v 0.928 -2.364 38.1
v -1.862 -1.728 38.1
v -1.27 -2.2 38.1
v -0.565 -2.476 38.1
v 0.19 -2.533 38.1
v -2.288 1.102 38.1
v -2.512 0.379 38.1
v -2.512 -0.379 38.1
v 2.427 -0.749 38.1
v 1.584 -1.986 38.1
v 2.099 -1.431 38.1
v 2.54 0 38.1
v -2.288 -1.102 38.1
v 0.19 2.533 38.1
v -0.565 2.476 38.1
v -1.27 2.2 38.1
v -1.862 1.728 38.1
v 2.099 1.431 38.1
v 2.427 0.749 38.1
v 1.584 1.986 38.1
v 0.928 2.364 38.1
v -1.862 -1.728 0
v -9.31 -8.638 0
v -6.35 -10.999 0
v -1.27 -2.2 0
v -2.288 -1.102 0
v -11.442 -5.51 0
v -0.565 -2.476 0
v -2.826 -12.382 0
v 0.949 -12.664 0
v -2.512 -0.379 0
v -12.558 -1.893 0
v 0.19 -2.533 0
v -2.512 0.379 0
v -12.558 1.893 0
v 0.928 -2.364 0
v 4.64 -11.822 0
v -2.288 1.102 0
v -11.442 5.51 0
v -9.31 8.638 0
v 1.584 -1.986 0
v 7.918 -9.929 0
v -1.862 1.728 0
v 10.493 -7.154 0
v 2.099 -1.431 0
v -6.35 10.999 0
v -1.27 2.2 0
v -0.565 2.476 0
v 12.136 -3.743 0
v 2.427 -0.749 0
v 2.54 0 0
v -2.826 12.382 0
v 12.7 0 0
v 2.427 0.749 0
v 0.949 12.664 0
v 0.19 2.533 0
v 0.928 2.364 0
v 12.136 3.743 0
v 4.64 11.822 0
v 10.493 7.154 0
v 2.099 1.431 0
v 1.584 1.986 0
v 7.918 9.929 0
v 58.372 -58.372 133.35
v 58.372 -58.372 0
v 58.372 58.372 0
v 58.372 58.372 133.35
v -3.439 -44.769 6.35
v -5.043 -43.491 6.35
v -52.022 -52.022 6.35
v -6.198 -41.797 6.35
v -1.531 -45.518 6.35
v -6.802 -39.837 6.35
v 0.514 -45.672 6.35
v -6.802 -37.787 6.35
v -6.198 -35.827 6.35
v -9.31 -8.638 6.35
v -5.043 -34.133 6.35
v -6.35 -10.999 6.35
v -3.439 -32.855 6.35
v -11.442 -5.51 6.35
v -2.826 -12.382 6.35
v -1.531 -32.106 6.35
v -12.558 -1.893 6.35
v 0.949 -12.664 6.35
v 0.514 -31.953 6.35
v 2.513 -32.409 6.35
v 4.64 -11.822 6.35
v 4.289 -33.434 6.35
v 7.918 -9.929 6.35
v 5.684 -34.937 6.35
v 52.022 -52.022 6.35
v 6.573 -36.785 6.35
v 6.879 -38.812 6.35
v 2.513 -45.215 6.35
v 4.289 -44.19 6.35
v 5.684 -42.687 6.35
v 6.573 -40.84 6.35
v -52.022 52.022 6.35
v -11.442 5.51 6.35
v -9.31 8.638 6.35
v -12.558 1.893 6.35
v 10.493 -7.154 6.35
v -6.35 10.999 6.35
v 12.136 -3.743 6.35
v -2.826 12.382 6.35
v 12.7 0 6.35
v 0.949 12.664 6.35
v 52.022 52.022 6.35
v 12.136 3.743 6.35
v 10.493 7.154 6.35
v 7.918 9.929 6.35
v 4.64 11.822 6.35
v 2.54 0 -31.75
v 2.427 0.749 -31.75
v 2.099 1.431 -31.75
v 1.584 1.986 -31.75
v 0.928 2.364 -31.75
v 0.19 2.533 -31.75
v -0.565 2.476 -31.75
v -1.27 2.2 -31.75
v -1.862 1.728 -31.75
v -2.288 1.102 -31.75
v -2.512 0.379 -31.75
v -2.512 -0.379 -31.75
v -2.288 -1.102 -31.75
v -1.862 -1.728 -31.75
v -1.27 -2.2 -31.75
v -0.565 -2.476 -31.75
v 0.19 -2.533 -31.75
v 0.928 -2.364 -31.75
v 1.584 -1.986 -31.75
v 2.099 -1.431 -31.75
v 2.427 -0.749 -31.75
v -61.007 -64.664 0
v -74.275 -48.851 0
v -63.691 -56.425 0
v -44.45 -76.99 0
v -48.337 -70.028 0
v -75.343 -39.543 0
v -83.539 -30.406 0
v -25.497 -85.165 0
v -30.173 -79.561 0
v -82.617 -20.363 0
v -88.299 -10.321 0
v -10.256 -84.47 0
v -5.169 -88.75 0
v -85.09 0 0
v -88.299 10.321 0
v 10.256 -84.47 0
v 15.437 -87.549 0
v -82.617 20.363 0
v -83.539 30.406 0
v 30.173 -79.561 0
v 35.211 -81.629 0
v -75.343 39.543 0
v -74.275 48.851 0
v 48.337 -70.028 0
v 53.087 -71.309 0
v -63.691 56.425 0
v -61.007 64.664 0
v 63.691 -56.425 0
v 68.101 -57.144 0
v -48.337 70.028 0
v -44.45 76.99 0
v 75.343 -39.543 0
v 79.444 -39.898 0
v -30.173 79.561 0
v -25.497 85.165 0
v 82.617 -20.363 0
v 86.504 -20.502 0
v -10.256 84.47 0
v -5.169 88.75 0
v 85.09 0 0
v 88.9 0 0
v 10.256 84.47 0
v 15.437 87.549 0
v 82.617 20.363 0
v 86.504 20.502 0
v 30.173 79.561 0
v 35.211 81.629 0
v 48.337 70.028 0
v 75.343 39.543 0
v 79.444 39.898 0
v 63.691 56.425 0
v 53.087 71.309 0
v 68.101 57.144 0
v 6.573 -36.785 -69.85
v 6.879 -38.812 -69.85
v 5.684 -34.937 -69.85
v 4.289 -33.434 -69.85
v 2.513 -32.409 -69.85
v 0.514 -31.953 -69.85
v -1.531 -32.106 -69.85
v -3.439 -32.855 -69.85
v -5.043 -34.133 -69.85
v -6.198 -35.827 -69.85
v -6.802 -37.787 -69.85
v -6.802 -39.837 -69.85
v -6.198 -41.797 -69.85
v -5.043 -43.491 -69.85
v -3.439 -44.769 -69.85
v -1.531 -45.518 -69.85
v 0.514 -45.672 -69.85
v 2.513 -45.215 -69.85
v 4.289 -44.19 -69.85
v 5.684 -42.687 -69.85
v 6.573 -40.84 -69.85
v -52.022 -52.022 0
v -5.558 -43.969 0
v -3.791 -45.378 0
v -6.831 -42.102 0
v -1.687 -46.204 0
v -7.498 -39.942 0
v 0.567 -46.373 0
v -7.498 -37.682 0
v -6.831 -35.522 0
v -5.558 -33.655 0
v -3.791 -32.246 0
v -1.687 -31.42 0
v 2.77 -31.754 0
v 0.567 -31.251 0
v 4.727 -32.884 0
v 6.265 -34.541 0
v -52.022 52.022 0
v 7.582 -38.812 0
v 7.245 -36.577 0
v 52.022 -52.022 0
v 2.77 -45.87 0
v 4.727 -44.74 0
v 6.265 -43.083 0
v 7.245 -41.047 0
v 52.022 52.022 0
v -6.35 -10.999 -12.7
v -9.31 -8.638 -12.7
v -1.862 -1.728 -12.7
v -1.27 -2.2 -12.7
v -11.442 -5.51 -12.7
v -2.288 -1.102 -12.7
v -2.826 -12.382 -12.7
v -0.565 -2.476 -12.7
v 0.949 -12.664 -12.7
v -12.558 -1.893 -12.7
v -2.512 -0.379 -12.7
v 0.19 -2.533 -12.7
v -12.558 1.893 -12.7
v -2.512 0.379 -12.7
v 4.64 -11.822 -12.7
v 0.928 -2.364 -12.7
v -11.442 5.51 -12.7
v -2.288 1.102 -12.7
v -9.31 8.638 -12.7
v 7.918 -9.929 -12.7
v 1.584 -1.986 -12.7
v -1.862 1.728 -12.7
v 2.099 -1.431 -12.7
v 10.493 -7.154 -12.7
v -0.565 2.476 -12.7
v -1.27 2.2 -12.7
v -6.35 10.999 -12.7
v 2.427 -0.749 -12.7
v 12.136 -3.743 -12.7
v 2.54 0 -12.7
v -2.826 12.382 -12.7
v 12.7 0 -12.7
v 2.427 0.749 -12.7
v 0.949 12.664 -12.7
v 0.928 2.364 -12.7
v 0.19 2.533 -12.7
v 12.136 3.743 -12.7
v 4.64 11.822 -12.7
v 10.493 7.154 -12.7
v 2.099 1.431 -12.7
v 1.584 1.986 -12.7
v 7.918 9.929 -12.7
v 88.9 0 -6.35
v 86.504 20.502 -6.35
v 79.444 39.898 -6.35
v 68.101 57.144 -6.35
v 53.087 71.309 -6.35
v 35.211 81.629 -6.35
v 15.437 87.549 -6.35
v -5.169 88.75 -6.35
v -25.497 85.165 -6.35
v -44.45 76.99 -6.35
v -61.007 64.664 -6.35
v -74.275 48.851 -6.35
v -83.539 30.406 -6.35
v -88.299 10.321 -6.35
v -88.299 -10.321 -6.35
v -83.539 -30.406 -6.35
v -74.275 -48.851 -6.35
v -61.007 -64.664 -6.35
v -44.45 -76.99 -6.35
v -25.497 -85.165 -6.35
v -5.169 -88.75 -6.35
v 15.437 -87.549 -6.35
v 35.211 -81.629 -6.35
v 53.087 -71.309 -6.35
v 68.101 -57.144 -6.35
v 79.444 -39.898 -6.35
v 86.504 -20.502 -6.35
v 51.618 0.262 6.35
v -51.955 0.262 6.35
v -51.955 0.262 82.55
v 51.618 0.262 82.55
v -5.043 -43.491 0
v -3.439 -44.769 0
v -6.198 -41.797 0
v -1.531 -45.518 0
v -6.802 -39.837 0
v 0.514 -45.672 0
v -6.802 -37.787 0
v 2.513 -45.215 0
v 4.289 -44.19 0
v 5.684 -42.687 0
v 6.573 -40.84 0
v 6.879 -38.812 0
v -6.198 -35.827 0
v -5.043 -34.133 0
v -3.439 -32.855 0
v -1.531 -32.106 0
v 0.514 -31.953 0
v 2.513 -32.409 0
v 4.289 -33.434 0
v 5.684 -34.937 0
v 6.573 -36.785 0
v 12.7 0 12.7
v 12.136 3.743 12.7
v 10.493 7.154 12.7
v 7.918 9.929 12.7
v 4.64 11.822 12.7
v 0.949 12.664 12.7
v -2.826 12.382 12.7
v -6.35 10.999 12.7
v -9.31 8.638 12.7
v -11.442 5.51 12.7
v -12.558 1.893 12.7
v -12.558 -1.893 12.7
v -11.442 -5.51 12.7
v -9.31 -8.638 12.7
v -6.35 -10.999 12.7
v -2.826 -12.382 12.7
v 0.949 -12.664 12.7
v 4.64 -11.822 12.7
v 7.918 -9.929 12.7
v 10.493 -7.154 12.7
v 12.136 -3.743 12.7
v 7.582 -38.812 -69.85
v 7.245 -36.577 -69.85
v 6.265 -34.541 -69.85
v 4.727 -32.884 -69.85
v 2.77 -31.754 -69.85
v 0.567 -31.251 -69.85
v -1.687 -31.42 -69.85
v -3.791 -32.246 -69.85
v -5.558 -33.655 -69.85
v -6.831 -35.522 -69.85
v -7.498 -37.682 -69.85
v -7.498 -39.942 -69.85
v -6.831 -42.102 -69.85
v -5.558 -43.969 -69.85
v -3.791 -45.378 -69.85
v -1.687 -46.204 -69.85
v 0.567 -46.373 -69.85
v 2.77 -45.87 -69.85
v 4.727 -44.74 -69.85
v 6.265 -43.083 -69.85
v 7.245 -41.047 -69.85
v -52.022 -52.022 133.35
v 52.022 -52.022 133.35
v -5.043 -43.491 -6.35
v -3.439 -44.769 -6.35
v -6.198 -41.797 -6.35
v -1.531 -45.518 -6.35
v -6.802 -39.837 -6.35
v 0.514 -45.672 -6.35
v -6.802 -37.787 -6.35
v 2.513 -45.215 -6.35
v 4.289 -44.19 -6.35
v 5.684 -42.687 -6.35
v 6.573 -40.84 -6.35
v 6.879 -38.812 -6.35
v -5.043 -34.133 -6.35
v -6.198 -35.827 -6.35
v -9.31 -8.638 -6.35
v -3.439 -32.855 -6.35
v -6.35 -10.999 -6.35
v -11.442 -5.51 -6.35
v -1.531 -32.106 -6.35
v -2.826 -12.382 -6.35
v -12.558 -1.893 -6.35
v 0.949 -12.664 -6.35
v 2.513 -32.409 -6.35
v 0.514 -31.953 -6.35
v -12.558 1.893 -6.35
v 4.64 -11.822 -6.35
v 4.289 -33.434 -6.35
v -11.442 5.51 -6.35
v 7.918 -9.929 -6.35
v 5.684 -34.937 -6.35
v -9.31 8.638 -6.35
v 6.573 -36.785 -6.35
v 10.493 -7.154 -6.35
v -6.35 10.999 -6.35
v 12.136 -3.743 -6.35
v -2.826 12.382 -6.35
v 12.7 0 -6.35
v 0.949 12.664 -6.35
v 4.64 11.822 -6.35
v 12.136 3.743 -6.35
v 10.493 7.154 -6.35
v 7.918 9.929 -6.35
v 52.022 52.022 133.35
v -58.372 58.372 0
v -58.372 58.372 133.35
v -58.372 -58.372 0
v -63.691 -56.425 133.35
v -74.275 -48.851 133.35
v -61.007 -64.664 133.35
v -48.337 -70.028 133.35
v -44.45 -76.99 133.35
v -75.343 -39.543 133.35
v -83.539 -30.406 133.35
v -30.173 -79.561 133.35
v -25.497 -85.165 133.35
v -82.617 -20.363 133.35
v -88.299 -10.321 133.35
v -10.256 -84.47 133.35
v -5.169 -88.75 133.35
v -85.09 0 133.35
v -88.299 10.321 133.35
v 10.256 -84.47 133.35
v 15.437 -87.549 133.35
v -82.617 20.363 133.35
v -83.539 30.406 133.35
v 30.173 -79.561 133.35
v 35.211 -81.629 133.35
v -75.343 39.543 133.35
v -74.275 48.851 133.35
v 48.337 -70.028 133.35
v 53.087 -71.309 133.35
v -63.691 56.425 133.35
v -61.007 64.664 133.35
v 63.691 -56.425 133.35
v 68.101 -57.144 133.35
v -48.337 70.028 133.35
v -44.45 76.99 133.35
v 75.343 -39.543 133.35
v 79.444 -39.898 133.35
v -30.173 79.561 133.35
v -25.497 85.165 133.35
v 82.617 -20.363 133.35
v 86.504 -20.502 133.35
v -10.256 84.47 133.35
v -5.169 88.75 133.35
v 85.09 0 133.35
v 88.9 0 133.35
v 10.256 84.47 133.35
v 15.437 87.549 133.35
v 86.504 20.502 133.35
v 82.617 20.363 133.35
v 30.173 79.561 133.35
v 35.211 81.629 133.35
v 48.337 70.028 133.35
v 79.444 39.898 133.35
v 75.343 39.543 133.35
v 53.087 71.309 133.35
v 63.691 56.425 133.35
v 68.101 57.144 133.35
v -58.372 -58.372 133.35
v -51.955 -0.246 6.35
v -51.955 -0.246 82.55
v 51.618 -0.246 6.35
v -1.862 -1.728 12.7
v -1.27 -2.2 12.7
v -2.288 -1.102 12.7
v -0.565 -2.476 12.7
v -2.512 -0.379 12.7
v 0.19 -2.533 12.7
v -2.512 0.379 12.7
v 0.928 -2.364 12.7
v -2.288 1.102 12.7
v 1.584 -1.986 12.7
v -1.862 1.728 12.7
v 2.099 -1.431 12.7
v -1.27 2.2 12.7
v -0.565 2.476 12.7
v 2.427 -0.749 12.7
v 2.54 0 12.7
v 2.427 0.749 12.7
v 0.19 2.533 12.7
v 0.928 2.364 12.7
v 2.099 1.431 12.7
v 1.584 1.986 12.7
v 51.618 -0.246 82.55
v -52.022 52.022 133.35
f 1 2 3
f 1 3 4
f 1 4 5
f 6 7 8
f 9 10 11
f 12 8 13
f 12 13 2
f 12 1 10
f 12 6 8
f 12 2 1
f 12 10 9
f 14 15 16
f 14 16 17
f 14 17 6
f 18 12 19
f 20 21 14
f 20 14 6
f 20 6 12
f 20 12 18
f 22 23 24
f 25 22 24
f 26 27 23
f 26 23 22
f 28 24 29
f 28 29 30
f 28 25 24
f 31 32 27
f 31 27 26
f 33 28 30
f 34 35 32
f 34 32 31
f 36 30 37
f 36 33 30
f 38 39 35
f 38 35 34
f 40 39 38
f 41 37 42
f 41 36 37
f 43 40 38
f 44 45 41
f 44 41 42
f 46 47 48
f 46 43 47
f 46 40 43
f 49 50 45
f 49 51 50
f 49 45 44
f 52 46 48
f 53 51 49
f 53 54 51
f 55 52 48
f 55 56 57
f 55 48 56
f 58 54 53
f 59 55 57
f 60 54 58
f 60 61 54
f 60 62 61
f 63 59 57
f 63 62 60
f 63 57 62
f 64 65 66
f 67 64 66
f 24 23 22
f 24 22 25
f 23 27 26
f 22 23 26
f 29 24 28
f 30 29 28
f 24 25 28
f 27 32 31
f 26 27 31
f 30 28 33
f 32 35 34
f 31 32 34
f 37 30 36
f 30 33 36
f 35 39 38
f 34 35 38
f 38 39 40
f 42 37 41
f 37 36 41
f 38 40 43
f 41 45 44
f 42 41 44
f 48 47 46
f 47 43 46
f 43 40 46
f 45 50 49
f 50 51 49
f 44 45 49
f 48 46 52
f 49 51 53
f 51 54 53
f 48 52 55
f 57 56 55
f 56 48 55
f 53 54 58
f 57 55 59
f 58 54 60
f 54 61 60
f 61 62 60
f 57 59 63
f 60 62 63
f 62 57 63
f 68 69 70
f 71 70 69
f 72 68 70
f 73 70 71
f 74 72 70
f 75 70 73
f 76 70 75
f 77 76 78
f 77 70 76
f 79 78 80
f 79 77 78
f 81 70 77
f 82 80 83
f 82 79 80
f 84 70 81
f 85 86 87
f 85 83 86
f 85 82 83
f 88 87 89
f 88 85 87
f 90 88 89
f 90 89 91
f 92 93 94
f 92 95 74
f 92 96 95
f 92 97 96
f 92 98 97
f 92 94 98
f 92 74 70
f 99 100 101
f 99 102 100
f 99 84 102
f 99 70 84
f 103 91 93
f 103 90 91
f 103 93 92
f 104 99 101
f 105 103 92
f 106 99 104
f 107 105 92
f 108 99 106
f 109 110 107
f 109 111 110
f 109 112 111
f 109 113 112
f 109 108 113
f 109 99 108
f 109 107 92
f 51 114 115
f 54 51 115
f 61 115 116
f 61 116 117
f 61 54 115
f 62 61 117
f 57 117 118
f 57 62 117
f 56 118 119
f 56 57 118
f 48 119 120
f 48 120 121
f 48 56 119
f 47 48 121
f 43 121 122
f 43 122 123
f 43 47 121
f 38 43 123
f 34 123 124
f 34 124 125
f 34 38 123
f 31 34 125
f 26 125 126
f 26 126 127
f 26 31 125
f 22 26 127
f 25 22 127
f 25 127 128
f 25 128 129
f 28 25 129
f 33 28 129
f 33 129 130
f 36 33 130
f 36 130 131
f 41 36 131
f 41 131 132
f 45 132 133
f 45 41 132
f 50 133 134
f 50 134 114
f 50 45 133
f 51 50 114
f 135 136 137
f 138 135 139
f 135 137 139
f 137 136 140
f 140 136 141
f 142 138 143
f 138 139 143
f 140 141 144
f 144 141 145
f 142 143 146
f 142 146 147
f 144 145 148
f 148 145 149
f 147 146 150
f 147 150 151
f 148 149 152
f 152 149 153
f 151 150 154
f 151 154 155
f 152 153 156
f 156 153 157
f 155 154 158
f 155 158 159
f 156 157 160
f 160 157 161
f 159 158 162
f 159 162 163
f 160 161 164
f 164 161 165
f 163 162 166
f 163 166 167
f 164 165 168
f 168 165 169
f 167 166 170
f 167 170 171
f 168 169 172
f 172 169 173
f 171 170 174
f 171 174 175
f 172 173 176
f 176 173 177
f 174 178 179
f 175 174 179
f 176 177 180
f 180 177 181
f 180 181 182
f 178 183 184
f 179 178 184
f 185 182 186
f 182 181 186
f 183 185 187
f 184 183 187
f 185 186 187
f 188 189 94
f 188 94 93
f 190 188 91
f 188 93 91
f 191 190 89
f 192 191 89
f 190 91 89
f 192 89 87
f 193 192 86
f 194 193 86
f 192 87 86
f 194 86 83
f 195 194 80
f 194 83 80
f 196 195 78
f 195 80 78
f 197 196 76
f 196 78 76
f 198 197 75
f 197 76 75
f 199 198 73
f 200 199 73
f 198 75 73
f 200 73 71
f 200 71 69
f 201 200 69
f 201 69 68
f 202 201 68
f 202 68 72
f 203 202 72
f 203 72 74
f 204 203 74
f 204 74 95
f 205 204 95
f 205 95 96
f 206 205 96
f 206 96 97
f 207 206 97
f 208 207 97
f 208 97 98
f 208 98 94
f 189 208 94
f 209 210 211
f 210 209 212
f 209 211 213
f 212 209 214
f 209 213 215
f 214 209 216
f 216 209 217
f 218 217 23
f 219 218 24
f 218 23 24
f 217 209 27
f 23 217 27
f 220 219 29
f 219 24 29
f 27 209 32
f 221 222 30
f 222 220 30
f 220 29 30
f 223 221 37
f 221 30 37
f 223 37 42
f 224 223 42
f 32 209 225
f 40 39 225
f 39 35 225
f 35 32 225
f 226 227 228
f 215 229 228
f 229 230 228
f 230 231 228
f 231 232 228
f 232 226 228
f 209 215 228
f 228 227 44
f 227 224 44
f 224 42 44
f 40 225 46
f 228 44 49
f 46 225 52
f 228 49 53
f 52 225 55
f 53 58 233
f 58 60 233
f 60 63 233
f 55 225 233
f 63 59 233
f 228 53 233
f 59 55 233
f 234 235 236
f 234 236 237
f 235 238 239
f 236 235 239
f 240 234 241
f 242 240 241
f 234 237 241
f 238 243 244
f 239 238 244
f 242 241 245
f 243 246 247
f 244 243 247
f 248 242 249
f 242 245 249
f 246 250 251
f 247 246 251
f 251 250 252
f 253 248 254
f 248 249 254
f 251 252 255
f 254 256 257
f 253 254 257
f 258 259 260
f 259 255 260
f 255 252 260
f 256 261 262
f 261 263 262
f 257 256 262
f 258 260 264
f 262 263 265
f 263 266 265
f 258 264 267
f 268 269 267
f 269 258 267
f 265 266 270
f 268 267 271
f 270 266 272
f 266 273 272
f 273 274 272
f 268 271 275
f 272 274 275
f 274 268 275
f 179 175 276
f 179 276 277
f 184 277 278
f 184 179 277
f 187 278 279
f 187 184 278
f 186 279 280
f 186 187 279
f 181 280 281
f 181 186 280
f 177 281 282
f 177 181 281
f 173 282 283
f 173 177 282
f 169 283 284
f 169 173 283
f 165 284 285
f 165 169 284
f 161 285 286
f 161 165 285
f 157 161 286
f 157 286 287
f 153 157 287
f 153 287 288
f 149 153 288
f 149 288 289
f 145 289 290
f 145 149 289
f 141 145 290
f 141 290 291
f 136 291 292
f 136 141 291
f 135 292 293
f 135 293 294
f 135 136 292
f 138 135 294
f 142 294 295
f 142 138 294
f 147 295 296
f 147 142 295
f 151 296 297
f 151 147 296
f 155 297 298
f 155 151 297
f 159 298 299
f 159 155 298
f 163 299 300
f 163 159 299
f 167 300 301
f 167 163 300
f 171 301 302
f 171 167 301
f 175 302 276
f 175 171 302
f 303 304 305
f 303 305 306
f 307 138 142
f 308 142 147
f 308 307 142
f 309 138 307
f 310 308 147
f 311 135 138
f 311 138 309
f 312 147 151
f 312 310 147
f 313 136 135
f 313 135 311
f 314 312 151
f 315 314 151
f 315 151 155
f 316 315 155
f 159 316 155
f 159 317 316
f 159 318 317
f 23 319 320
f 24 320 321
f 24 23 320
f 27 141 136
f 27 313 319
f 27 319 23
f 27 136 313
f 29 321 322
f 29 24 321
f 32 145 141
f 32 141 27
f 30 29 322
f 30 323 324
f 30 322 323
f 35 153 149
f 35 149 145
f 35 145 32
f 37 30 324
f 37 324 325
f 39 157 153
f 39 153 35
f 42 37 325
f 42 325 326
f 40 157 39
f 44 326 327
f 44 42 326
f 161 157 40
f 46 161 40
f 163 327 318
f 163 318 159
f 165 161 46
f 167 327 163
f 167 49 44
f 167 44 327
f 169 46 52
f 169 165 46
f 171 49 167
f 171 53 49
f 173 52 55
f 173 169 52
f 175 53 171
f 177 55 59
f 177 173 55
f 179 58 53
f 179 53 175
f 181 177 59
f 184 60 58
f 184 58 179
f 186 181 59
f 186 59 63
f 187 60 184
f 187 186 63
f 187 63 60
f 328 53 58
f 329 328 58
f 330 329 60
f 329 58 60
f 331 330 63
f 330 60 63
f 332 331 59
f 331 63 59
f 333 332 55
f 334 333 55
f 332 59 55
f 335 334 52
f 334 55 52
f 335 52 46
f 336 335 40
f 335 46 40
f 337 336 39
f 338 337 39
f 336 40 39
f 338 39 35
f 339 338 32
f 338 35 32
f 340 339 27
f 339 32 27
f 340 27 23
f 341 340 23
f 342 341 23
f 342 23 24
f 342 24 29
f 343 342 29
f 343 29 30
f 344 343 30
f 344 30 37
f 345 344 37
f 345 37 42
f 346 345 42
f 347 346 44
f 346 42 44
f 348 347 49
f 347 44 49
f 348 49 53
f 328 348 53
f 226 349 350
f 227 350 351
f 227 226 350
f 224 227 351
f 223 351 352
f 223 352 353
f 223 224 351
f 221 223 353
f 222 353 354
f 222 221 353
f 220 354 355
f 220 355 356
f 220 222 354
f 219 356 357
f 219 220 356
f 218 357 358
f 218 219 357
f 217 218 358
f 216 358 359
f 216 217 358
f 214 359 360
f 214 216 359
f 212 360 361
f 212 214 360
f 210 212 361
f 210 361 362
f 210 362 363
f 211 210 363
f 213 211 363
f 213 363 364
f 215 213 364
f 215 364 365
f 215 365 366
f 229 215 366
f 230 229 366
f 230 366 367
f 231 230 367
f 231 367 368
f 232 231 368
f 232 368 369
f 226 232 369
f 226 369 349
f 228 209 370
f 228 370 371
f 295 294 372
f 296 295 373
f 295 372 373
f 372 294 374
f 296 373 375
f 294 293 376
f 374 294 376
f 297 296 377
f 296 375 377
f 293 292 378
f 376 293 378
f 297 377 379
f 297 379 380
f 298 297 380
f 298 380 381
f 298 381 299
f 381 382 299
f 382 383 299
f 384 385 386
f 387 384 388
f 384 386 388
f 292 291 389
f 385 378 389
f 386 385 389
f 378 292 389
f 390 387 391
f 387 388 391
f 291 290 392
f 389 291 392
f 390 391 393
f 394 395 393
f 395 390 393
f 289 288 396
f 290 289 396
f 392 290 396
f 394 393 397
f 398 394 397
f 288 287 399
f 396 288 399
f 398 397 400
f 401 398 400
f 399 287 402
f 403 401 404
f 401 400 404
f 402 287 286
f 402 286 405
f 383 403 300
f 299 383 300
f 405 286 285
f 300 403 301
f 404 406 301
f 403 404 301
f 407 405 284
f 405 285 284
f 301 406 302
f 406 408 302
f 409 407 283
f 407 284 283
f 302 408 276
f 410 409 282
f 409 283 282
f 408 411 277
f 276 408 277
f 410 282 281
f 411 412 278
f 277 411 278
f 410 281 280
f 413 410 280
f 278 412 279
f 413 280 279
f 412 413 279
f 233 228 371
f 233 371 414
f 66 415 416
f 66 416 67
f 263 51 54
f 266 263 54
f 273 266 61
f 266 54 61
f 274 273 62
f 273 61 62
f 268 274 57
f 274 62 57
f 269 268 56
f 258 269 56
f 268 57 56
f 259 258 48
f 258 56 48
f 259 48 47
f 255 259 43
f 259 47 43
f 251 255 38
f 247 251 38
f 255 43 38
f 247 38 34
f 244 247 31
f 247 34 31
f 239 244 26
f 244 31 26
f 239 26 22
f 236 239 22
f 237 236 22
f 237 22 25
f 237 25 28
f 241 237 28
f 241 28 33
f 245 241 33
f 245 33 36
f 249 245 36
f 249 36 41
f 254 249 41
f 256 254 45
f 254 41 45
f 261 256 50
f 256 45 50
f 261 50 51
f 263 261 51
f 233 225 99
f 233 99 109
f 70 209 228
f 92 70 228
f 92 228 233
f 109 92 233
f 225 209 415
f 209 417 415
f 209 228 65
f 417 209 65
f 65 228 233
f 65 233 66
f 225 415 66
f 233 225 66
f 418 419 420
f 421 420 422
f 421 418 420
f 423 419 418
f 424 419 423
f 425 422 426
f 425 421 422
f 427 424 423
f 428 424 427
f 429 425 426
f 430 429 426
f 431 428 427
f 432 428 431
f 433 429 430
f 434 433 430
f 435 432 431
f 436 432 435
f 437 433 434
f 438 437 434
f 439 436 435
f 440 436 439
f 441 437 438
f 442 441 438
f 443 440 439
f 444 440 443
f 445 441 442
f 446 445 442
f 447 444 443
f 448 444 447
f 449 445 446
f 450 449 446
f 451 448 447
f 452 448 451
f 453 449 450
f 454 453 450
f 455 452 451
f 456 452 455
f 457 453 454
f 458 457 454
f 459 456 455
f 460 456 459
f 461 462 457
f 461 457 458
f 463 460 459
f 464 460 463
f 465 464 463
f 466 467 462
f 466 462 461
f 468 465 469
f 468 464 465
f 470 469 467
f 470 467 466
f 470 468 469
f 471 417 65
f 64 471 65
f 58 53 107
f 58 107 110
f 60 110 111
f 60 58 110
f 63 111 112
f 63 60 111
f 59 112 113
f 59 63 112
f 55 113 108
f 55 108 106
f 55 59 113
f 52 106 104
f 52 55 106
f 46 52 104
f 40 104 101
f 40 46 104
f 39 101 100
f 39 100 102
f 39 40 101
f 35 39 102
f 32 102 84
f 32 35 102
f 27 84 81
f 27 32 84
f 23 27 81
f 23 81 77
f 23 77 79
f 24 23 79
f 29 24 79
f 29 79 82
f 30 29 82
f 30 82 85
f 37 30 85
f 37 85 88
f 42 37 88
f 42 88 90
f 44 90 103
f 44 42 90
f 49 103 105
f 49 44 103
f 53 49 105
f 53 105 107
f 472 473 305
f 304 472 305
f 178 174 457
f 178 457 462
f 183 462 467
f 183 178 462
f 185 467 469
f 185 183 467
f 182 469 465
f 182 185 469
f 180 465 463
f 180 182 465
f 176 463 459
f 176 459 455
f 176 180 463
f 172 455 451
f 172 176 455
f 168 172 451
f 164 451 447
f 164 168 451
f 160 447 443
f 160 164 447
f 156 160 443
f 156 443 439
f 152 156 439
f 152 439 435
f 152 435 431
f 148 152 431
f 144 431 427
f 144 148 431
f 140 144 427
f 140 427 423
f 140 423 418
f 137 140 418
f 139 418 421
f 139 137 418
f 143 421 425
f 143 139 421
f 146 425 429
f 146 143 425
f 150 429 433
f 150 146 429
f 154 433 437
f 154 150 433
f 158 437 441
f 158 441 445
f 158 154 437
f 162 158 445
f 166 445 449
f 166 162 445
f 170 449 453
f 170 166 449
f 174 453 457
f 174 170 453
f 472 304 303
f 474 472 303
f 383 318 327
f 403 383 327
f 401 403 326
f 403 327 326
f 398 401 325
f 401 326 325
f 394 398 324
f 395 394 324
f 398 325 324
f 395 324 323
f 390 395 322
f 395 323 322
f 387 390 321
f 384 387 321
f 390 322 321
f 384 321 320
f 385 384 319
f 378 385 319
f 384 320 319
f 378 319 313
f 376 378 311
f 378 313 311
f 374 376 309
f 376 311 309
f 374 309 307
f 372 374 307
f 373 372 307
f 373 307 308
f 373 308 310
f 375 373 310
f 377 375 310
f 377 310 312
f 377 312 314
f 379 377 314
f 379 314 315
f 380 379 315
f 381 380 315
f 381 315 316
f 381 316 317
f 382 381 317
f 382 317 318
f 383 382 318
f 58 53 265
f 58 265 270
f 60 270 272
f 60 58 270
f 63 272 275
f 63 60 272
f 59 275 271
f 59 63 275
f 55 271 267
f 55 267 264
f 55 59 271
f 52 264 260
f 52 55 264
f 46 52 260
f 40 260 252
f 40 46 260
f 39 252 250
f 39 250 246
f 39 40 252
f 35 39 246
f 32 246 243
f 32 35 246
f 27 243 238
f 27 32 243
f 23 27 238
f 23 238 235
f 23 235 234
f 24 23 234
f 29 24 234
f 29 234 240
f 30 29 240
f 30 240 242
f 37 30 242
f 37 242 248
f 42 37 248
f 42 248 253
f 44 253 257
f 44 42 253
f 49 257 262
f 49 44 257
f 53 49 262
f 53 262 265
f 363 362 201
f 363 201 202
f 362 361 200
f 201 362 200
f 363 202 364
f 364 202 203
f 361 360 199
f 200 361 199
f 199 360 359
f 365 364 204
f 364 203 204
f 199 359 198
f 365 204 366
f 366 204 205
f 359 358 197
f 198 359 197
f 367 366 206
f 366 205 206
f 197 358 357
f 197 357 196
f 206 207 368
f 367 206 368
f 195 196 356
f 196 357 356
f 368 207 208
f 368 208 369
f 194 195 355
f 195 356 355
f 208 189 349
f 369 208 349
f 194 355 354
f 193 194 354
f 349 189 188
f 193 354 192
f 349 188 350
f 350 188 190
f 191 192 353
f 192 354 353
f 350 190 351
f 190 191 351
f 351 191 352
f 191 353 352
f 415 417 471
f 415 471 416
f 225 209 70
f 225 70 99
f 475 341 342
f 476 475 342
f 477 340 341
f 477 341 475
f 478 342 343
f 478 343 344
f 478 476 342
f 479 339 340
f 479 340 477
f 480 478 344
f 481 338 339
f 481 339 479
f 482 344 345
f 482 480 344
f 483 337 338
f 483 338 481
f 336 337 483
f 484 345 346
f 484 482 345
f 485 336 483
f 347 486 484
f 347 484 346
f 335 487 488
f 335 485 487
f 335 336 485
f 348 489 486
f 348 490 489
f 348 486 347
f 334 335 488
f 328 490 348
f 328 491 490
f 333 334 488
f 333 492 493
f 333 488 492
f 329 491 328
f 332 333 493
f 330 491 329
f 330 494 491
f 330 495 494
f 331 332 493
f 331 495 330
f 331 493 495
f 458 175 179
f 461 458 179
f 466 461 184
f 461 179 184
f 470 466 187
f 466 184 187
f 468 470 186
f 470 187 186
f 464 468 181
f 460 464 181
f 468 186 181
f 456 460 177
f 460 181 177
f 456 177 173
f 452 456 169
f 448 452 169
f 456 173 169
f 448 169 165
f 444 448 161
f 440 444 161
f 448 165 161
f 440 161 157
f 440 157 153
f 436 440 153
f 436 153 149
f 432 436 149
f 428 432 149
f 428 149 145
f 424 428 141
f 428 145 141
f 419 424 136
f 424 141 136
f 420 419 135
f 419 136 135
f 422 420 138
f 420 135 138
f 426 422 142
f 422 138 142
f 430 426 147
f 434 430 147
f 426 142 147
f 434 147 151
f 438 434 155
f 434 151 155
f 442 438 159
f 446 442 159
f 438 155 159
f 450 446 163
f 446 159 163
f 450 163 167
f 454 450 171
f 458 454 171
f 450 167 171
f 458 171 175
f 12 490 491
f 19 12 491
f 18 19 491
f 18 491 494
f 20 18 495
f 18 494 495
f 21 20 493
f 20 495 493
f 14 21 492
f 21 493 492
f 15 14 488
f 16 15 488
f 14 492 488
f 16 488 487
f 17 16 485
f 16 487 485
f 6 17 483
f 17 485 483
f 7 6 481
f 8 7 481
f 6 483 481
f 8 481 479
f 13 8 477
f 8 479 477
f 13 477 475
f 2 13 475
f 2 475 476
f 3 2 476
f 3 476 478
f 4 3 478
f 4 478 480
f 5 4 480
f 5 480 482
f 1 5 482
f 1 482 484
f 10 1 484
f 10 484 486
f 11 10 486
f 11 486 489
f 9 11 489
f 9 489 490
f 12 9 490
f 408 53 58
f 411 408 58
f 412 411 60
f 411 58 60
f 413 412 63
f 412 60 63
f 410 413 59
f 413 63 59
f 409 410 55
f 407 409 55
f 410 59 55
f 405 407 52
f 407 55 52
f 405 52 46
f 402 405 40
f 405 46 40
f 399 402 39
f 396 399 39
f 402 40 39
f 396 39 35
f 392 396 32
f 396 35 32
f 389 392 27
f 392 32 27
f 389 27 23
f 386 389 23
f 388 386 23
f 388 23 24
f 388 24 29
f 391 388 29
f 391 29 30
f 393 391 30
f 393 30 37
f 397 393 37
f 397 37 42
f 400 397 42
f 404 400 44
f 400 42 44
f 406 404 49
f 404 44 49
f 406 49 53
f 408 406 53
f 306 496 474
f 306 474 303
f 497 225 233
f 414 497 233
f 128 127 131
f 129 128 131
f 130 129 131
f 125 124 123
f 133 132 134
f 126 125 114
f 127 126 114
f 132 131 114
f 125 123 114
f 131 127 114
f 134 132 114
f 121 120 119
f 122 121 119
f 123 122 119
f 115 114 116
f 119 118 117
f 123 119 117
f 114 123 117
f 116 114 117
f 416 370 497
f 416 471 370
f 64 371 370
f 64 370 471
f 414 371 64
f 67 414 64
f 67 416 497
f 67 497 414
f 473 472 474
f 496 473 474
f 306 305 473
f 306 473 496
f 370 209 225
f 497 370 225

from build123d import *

# Parameters (mm, degrees)
F0_R      = 88.9
F0_R_2    = 85.09
F1_DEPTH  = 133.35
F0_W      = 116.7433295739
F0_H      = 116.7433295739
F0_W_2    = 104.0433295739
F0_H_2    = 104.0433295739
F2_DEPTH  = 133.35
F0_R_3    = 12.7
F0_R_4    = 2.54
F3_DEPTH  = 12.7
F4_DEPTH  = 6.35
F5_DEPTH  = 38.1
F6_DEPTH  = 6.35
F7_DEPTH  = 31.75
F8_DEPTH  = 12.7
F9_R      = 7.5822179206
F9_R_2    = 6.878807978
F10_DEPTH = 76.2
F11_DEPTH = 76.201
F12_DEPTH = 12.7
F13_W     = 103.5729488625
F13_H     = 0.508
F14_DEPTH = 76.2


with BuildPart() as f1:
    # F0 (on Top) → F1 (new body)
    with BuildSketch(Plane.XY):
        Circle(F0_R)
        Circle(F0_R_2, mode=Mode.SUBTRACT)
    extrude(amount=F1_DEPTH)

    # F9 (on face) → F12 (cut)
    with BuildSketch(Plane.XY.offset(6.35)):
        with Locations((0, -38.8120859861)):
            Circle(F9_R_2)
    extrude(amount=-F12_DEPTH, mode=Mode.SUBTRACT)


with BuildPart() as f2:
    # F0 (on Top) → F2 (new body)
    with BuildSketch(Plane.XY):
        Rectangle(F0_W, F0_H)
        Rectangle(F0_W_2, F0_H_2, mode=Mode.SUBTRACT)
    extrude(amount=F2_DEPTH)


with BuildPart() as f3:
    # F0 (on Top) → F3 (new body)
    with BuildSketch(Plane.XY):
        Circle(F0_R_3)
        Circle(F0_R_4, mode=Mode.SUBTRACT)
    extrude(amount=F3_DEPTH)

    # F0 (on Top) → F5 (join)
    with BuildSketch(Plane.XY):
        Circle(F0_R_4)
    extrude(amount=F5_DEPTH)

    # F0 (on Top) → F7 (join)
    with BuildSketch(Plane.XY):
        Circle(F0_R_4)
    extrude(amount=-F7_DEPTH)


with BuildPart() as f4:
    # F0 (on Top) → F4 (new body)
    with BuildSketch(Plane.XY):
        Rectangle(F0_W_2, F0_H_2)
        Circle(F0_R_3, mode=Mode.SUBTRACT)
    extrude(amount=F4_DEPTH)

    # F9 (on face) → F10 (join)
    with BuildSketch(Plane.XY.offset(6.35)):
        with Locations((0, -38.8120859861)):
            Circle(F9_R)
        with Locations((0, -38.8120859861)):
            Circle(F9_R_2, mode=Mode.SUBTRACT)
    extrude(amount=-F10_DEPTH)


with BuildPart() as f6:
    # F0 (on Top) → F6 (new body)
    with BuildSketch(Plane.XY):
        Circle(F0_R)
        Circle(F0_R_2, mode=Mode.SUBTRACT)
        Circle(F0_R_2)
        Rectangle(F0_W, F0_H, mode=Mode.SUBTRACT)
        Rectangle(F0_W, F0_H)
        Rectangle(F0_W_2, F0_H_2, mode=Mode.SUBTRACT)
        Rectangle(F0_W_2, F0_H_2)
        Circle(F0_R_3, mode=Mode.SUBTRACT)
    extrude(amount=-F6_DEPTH)


with BuildPart() as f8:
    # F0 (on Top) → F8 (new body)
    with BuildSketch(Plane.XY):
        Circle(F0_R_3)
        Circle(F0_R_4, mode=Mode.SUBTRACT)
    extrude(amount=-F8_DEPTH)


with BuildPart() as f11_tool:
    # F9 (on face) → F11 (new body, through all)
    with BuildSketch(Plane.XY.offset(6.35)):
        with Locations((0, -38.8120859861)):
            Circle(F9_R_2)
    extrude(amount=-F11_DEPTH)


with BuildPart() as f4_1:
    add(f4.part)

    # F11: cut by f11_tool
    add(f11_tool.part, mode=Mode.SUBTRACT)


with BuildPart() as f6_1:
    add(f6.part)

    # F11: cut by f11_tool
    add(f11_tool.part, mode=Mode.SUBTRACT)


with BuildPart() as f14:
    # F13 (on face) → F14 (new body)
    with BuildSketch(Plane.XY.offset(6.35)):
        with Locations((-0.1688851044, 0.0075928365)):
            Rectangle(F13_W, F13_H)
    extrude(amount=F14_DEPTH)


solid = Compound([f1.part, f2.part, f3.part, f8.part, f4_1.part, f6_1.part, f14.part])
